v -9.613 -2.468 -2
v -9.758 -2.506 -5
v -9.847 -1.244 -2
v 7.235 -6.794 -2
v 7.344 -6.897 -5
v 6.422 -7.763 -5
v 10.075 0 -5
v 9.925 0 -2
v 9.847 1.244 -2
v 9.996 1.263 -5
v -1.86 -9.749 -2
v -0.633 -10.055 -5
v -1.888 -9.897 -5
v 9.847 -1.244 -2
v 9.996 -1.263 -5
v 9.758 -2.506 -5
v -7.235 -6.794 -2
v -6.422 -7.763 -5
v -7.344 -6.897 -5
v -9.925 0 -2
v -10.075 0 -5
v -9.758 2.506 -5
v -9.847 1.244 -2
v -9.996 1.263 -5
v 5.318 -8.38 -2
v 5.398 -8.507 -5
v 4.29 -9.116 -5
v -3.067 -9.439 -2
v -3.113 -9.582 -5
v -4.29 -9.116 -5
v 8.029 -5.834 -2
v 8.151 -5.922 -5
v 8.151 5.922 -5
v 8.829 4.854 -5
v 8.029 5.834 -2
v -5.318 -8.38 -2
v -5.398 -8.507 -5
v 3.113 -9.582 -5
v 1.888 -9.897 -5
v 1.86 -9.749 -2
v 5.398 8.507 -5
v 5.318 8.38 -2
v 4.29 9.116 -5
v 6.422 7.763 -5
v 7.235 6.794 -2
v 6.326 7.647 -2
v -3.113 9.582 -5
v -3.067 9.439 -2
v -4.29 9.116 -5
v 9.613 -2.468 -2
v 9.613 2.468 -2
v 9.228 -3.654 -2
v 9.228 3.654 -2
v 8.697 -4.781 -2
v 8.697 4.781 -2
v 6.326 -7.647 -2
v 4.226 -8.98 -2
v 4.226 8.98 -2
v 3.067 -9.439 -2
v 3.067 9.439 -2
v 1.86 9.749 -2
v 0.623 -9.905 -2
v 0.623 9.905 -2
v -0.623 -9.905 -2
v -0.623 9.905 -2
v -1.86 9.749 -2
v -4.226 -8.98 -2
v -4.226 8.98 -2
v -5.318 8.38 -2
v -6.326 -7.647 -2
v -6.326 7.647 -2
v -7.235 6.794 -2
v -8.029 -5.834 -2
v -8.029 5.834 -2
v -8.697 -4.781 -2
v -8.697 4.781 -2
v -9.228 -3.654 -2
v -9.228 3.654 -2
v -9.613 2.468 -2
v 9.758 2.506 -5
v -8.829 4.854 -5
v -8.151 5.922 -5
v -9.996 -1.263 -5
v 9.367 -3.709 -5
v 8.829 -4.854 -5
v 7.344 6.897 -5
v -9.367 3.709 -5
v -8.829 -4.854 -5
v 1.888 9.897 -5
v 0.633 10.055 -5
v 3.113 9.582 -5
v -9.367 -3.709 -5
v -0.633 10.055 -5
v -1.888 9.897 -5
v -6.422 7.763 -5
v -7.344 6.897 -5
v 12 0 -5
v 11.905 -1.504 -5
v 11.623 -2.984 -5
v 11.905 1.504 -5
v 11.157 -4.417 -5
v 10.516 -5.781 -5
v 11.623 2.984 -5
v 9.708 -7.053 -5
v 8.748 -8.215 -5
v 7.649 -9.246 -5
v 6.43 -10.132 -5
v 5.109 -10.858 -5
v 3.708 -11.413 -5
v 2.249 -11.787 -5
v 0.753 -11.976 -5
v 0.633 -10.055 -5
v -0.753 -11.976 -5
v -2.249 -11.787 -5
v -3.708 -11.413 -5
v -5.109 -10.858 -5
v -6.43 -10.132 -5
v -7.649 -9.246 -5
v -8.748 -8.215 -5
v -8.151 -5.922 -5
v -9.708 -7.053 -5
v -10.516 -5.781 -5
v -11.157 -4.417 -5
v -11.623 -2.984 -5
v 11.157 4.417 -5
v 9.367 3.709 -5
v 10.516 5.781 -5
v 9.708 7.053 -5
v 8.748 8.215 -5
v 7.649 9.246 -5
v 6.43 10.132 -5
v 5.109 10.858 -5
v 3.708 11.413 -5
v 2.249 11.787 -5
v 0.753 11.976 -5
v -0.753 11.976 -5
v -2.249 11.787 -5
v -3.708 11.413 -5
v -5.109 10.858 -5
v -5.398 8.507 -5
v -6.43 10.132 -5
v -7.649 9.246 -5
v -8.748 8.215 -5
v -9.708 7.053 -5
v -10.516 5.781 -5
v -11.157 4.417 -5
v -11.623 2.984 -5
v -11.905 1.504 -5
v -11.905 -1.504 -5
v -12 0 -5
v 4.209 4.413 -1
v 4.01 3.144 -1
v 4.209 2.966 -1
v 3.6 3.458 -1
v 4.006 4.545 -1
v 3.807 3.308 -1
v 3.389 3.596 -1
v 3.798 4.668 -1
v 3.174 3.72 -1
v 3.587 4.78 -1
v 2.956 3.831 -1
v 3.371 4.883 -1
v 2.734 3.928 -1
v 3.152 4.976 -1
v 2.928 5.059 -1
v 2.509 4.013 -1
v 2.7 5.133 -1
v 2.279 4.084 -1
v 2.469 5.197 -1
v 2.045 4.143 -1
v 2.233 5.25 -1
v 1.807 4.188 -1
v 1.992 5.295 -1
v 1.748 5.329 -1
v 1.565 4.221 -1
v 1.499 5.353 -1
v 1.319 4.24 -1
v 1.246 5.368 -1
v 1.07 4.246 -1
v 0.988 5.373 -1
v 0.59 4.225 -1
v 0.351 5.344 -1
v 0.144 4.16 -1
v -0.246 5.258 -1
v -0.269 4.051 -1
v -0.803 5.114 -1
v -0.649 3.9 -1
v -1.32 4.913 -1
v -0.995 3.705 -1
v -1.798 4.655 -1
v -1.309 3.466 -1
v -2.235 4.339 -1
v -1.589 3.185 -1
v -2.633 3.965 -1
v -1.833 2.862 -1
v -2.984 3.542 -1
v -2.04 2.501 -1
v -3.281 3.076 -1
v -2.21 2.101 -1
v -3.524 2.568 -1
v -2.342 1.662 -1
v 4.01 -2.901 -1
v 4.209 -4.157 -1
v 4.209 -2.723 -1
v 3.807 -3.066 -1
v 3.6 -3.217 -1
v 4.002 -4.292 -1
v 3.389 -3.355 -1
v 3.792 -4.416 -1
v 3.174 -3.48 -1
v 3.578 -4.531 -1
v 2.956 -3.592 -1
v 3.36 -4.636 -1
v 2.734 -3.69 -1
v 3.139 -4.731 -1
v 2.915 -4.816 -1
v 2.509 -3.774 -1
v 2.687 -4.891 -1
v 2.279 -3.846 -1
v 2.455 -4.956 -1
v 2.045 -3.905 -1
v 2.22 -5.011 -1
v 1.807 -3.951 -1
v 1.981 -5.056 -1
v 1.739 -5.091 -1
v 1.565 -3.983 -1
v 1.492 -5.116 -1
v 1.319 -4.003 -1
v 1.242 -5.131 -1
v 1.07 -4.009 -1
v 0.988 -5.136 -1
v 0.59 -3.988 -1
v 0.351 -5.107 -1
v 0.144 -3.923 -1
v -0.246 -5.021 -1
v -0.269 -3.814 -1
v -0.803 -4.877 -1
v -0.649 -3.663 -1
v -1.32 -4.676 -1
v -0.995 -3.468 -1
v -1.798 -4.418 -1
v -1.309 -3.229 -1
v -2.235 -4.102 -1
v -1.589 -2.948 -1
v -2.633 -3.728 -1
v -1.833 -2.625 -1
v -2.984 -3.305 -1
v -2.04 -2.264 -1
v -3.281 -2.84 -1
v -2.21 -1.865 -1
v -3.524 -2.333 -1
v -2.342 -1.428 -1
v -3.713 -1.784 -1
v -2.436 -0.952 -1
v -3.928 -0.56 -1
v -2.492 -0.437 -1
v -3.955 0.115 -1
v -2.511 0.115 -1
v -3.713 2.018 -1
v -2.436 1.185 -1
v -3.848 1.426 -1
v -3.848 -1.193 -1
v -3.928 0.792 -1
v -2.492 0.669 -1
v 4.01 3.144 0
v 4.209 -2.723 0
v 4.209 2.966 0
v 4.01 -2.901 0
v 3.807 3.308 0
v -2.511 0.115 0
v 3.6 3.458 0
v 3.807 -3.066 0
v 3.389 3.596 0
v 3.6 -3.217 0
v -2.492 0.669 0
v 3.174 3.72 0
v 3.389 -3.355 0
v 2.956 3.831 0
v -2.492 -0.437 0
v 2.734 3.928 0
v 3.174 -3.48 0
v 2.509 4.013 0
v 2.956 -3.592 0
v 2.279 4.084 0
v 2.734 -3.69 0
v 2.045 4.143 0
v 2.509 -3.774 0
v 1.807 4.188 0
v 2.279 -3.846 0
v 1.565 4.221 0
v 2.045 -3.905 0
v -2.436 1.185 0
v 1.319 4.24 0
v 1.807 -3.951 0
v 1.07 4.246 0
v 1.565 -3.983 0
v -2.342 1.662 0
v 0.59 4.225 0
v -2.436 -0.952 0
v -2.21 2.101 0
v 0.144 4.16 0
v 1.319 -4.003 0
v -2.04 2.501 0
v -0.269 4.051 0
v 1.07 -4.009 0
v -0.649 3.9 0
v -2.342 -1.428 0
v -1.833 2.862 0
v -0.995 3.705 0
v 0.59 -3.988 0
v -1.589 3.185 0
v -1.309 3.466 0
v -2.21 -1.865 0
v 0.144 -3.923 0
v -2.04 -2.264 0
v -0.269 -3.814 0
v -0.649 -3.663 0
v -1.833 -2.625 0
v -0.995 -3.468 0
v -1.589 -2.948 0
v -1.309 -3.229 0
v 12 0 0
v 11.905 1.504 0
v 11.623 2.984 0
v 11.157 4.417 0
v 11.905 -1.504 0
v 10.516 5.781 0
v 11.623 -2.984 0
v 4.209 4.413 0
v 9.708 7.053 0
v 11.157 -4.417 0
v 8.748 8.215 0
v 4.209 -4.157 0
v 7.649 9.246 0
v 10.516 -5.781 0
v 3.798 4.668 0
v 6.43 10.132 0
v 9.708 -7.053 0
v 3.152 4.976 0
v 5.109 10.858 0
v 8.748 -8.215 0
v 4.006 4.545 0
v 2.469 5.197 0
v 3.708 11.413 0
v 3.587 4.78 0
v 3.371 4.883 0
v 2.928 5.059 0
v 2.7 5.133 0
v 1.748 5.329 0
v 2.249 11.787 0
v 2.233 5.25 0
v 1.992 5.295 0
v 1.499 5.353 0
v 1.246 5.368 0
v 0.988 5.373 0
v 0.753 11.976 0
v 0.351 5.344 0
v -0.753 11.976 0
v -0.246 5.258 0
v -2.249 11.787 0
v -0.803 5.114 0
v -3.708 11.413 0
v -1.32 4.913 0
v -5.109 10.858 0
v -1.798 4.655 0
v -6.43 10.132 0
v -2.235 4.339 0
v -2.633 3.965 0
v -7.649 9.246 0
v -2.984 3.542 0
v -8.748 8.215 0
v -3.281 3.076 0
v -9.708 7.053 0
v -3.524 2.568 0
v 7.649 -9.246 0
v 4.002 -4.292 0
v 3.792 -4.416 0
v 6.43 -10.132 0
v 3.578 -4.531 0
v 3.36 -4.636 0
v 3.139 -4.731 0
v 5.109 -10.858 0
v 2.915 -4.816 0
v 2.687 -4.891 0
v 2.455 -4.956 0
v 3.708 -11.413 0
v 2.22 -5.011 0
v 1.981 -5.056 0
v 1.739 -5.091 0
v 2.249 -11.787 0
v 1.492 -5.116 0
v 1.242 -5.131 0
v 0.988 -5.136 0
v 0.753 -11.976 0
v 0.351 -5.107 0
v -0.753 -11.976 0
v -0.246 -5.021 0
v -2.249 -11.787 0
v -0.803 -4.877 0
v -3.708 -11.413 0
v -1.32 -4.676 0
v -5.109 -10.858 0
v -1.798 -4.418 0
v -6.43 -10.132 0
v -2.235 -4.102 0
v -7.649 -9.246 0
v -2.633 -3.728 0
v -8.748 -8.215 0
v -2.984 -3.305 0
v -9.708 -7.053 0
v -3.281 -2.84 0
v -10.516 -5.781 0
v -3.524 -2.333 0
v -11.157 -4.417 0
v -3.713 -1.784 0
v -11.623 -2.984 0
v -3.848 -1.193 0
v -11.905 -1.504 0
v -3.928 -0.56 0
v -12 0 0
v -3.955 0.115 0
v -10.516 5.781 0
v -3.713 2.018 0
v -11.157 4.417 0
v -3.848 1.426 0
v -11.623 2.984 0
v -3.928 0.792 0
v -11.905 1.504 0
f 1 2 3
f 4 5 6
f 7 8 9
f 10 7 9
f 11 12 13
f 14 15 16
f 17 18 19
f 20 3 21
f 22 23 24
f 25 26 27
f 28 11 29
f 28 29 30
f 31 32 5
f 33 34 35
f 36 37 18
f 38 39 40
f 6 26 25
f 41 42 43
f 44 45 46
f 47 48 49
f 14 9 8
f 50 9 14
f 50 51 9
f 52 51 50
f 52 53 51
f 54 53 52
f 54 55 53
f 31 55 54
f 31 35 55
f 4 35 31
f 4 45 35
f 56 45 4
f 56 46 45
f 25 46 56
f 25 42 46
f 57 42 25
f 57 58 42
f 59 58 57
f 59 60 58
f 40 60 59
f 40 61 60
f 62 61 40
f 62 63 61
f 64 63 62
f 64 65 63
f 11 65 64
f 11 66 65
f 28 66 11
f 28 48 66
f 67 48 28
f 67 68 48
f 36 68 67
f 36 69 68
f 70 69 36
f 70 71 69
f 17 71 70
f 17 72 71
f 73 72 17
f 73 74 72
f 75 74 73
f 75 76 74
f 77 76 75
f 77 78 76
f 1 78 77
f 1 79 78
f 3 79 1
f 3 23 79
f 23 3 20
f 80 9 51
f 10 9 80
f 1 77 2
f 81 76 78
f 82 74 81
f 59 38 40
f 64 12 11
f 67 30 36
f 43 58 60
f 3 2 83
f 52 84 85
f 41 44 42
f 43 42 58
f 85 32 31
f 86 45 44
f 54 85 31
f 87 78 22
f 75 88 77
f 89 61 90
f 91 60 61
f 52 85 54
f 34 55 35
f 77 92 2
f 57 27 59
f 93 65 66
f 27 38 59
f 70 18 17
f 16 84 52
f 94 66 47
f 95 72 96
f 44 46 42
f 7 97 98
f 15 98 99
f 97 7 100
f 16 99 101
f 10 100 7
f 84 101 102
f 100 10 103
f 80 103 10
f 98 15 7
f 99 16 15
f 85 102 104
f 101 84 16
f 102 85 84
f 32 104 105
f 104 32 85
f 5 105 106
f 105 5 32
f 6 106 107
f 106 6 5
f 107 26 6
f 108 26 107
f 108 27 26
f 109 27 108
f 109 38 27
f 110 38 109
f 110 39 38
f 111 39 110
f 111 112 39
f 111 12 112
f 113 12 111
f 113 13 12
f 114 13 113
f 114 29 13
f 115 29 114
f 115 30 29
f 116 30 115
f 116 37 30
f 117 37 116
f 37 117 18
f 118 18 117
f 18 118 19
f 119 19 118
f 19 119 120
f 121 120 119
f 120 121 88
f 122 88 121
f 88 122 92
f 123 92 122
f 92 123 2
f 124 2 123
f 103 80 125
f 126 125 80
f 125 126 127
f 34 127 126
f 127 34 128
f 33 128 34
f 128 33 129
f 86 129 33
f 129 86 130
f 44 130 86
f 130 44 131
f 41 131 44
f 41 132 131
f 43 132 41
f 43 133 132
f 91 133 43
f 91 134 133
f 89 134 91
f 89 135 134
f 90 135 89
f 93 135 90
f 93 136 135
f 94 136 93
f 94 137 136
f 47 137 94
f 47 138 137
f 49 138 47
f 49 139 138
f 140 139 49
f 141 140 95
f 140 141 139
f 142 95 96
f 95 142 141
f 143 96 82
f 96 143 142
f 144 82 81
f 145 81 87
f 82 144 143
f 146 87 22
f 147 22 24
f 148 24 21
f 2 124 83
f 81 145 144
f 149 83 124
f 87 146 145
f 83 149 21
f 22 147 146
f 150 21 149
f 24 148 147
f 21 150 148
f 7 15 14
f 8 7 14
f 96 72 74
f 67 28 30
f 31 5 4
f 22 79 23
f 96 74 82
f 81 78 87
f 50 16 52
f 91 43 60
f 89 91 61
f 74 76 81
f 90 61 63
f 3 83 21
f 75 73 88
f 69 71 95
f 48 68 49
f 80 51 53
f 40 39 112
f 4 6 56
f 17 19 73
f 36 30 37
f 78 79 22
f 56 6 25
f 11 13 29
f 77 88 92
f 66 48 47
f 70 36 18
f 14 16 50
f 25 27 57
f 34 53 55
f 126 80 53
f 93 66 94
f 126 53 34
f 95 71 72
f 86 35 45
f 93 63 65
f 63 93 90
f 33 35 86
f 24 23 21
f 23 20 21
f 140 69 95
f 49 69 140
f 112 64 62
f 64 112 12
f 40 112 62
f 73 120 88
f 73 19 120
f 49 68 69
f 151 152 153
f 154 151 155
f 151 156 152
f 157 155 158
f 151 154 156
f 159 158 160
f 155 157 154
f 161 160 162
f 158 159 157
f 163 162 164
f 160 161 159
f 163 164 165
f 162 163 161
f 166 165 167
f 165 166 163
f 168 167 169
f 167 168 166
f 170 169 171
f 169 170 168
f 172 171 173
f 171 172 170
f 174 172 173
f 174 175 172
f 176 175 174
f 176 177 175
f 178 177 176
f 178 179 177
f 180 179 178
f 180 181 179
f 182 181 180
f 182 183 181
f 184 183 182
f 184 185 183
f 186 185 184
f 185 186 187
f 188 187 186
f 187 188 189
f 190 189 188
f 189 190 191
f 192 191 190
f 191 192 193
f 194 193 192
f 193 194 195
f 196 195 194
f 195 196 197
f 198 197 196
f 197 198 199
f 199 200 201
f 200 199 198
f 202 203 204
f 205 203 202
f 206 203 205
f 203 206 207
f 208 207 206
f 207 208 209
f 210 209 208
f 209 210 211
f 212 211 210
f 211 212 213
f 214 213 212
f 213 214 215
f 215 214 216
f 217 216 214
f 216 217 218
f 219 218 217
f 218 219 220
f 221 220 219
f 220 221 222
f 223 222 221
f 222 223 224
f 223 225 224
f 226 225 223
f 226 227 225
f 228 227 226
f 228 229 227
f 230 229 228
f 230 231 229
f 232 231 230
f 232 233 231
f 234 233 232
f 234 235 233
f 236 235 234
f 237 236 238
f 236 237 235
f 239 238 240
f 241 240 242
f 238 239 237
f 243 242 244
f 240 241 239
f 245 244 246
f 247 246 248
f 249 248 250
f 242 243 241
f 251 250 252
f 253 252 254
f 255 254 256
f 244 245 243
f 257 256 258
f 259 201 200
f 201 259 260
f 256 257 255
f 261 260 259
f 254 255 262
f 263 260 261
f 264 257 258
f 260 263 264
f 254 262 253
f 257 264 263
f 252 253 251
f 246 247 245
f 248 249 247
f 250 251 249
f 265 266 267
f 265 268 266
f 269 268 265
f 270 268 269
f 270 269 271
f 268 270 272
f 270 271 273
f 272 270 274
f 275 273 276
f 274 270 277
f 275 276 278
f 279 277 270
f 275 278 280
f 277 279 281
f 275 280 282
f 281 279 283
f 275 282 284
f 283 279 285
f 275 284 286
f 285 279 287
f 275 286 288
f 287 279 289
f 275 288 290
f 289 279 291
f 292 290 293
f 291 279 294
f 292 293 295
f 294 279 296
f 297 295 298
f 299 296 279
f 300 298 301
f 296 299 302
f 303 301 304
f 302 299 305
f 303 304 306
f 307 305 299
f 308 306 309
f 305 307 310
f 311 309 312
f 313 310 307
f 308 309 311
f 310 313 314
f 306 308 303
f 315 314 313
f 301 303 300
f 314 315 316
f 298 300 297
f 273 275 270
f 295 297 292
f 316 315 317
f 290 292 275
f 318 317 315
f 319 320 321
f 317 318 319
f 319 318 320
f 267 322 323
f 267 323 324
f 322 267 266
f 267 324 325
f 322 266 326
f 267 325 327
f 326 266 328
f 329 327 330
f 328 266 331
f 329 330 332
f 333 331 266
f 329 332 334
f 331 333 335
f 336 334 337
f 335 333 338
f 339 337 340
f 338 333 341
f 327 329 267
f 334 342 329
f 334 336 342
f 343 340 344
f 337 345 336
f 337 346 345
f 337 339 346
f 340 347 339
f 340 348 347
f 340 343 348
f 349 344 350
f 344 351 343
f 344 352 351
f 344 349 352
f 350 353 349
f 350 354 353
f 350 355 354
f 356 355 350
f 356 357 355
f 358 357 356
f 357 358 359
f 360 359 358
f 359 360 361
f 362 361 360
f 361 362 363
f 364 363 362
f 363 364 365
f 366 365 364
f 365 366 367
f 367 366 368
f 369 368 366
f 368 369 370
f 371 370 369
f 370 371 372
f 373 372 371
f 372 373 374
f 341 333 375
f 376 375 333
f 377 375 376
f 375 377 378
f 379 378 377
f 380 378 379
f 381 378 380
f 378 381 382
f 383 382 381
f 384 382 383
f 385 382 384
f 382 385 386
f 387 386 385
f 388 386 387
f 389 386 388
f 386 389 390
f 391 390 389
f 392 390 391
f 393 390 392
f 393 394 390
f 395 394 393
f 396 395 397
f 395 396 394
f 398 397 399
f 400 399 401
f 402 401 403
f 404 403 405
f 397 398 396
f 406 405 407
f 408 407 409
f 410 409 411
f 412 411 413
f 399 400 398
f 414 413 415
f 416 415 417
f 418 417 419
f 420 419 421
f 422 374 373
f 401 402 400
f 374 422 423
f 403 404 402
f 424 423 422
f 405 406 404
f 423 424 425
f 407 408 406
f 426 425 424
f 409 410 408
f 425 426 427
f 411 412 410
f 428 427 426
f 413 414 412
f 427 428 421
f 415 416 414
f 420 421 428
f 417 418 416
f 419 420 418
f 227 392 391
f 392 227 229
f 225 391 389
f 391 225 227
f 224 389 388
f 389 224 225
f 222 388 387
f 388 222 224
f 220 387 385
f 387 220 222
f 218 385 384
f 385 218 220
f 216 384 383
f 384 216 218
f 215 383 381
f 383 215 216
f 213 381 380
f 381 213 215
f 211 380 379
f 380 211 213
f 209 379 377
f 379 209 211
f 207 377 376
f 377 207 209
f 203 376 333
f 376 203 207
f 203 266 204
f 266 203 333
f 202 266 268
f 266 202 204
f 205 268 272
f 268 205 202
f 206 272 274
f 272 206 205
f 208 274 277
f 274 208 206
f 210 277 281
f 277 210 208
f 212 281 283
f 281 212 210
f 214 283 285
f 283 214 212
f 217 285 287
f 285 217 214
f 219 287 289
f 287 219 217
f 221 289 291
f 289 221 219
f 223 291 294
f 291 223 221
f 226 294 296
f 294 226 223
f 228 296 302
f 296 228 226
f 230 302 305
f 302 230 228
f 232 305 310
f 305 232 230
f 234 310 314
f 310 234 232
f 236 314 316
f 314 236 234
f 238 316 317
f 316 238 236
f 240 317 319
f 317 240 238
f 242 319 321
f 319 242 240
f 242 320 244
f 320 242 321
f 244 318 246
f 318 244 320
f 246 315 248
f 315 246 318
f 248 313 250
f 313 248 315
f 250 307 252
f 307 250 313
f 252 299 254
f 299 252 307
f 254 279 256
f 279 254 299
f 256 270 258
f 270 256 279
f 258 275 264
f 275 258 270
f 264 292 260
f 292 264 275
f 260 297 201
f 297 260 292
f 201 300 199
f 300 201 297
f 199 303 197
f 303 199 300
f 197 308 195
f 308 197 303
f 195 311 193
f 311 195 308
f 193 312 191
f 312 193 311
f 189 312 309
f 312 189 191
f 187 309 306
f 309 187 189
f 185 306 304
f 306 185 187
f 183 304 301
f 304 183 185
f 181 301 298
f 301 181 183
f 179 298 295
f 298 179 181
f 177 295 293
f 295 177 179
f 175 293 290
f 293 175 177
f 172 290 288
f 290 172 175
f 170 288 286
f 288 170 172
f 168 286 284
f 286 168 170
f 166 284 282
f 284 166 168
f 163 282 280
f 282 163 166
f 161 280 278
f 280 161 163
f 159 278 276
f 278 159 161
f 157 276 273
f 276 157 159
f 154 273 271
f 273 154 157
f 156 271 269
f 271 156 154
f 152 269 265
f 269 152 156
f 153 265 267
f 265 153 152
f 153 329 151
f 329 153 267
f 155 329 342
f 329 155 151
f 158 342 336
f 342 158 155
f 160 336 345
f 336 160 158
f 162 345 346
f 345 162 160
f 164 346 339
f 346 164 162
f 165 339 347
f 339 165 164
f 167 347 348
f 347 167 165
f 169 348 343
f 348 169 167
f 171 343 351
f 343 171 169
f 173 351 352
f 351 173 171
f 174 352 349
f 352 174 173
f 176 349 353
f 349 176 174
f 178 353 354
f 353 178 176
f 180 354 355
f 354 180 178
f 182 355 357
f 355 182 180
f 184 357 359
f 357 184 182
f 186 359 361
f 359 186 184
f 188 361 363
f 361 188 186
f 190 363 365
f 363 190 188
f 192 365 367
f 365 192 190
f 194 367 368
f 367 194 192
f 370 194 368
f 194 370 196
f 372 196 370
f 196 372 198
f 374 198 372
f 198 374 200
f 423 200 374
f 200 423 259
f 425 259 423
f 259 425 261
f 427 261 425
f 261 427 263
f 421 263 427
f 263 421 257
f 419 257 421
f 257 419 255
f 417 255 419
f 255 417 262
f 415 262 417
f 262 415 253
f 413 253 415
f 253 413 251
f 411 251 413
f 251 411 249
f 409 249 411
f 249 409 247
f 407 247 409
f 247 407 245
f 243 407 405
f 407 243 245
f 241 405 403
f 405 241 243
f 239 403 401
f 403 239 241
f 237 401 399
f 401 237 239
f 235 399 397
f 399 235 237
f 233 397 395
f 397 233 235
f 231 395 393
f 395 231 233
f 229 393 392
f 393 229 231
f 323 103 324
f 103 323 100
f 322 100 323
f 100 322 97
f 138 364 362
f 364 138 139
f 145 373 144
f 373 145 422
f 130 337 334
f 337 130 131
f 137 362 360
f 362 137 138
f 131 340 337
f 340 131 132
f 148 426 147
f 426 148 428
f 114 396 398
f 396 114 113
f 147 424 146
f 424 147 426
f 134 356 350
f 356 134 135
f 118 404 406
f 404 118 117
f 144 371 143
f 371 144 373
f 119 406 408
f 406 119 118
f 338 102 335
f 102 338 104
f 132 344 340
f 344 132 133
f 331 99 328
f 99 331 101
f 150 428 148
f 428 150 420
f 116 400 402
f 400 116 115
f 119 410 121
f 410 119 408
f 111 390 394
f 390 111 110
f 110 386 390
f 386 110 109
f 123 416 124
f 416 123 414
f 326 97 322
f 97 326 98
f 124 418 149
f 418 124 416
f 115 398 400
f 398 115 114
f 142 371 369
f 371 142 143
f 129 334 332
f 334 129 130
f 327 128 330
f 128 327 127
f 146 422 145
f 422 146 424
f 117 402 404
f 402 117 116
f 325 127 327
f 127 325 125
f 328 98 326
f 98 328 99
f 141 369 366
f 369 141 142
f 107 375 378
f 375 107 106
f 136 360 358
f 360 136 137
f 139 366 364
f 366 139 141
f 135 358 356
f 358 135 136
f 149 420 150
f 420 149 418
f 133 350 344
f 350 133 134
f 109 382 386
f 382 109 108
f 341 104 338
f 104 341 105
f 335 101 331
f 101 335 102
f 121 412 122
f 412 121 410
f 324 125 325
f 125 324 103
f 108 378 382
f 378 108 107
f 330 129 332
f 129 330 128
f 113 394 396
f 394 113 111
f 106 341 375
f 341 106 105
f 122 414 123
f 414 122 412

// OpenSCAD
$fn = 50;

difference() {
	union() {
		translate(v = [0, 0, -5.0]) {
			cylinder(h = 5, r = 12.0);
		}
	}
	union() {
		#translate(v = [0, 0, -5.0]) {
			cylinder(h = 3, r1 = 10.075, r2 = 9.925);
		}
		translate(v = [0, 0, -1]) {
			linear_extrude(height = 1) {
				text(font = "Impact", halign = "center", size = 10, text = "C", valign = "center");
			}
		}
	}
}
